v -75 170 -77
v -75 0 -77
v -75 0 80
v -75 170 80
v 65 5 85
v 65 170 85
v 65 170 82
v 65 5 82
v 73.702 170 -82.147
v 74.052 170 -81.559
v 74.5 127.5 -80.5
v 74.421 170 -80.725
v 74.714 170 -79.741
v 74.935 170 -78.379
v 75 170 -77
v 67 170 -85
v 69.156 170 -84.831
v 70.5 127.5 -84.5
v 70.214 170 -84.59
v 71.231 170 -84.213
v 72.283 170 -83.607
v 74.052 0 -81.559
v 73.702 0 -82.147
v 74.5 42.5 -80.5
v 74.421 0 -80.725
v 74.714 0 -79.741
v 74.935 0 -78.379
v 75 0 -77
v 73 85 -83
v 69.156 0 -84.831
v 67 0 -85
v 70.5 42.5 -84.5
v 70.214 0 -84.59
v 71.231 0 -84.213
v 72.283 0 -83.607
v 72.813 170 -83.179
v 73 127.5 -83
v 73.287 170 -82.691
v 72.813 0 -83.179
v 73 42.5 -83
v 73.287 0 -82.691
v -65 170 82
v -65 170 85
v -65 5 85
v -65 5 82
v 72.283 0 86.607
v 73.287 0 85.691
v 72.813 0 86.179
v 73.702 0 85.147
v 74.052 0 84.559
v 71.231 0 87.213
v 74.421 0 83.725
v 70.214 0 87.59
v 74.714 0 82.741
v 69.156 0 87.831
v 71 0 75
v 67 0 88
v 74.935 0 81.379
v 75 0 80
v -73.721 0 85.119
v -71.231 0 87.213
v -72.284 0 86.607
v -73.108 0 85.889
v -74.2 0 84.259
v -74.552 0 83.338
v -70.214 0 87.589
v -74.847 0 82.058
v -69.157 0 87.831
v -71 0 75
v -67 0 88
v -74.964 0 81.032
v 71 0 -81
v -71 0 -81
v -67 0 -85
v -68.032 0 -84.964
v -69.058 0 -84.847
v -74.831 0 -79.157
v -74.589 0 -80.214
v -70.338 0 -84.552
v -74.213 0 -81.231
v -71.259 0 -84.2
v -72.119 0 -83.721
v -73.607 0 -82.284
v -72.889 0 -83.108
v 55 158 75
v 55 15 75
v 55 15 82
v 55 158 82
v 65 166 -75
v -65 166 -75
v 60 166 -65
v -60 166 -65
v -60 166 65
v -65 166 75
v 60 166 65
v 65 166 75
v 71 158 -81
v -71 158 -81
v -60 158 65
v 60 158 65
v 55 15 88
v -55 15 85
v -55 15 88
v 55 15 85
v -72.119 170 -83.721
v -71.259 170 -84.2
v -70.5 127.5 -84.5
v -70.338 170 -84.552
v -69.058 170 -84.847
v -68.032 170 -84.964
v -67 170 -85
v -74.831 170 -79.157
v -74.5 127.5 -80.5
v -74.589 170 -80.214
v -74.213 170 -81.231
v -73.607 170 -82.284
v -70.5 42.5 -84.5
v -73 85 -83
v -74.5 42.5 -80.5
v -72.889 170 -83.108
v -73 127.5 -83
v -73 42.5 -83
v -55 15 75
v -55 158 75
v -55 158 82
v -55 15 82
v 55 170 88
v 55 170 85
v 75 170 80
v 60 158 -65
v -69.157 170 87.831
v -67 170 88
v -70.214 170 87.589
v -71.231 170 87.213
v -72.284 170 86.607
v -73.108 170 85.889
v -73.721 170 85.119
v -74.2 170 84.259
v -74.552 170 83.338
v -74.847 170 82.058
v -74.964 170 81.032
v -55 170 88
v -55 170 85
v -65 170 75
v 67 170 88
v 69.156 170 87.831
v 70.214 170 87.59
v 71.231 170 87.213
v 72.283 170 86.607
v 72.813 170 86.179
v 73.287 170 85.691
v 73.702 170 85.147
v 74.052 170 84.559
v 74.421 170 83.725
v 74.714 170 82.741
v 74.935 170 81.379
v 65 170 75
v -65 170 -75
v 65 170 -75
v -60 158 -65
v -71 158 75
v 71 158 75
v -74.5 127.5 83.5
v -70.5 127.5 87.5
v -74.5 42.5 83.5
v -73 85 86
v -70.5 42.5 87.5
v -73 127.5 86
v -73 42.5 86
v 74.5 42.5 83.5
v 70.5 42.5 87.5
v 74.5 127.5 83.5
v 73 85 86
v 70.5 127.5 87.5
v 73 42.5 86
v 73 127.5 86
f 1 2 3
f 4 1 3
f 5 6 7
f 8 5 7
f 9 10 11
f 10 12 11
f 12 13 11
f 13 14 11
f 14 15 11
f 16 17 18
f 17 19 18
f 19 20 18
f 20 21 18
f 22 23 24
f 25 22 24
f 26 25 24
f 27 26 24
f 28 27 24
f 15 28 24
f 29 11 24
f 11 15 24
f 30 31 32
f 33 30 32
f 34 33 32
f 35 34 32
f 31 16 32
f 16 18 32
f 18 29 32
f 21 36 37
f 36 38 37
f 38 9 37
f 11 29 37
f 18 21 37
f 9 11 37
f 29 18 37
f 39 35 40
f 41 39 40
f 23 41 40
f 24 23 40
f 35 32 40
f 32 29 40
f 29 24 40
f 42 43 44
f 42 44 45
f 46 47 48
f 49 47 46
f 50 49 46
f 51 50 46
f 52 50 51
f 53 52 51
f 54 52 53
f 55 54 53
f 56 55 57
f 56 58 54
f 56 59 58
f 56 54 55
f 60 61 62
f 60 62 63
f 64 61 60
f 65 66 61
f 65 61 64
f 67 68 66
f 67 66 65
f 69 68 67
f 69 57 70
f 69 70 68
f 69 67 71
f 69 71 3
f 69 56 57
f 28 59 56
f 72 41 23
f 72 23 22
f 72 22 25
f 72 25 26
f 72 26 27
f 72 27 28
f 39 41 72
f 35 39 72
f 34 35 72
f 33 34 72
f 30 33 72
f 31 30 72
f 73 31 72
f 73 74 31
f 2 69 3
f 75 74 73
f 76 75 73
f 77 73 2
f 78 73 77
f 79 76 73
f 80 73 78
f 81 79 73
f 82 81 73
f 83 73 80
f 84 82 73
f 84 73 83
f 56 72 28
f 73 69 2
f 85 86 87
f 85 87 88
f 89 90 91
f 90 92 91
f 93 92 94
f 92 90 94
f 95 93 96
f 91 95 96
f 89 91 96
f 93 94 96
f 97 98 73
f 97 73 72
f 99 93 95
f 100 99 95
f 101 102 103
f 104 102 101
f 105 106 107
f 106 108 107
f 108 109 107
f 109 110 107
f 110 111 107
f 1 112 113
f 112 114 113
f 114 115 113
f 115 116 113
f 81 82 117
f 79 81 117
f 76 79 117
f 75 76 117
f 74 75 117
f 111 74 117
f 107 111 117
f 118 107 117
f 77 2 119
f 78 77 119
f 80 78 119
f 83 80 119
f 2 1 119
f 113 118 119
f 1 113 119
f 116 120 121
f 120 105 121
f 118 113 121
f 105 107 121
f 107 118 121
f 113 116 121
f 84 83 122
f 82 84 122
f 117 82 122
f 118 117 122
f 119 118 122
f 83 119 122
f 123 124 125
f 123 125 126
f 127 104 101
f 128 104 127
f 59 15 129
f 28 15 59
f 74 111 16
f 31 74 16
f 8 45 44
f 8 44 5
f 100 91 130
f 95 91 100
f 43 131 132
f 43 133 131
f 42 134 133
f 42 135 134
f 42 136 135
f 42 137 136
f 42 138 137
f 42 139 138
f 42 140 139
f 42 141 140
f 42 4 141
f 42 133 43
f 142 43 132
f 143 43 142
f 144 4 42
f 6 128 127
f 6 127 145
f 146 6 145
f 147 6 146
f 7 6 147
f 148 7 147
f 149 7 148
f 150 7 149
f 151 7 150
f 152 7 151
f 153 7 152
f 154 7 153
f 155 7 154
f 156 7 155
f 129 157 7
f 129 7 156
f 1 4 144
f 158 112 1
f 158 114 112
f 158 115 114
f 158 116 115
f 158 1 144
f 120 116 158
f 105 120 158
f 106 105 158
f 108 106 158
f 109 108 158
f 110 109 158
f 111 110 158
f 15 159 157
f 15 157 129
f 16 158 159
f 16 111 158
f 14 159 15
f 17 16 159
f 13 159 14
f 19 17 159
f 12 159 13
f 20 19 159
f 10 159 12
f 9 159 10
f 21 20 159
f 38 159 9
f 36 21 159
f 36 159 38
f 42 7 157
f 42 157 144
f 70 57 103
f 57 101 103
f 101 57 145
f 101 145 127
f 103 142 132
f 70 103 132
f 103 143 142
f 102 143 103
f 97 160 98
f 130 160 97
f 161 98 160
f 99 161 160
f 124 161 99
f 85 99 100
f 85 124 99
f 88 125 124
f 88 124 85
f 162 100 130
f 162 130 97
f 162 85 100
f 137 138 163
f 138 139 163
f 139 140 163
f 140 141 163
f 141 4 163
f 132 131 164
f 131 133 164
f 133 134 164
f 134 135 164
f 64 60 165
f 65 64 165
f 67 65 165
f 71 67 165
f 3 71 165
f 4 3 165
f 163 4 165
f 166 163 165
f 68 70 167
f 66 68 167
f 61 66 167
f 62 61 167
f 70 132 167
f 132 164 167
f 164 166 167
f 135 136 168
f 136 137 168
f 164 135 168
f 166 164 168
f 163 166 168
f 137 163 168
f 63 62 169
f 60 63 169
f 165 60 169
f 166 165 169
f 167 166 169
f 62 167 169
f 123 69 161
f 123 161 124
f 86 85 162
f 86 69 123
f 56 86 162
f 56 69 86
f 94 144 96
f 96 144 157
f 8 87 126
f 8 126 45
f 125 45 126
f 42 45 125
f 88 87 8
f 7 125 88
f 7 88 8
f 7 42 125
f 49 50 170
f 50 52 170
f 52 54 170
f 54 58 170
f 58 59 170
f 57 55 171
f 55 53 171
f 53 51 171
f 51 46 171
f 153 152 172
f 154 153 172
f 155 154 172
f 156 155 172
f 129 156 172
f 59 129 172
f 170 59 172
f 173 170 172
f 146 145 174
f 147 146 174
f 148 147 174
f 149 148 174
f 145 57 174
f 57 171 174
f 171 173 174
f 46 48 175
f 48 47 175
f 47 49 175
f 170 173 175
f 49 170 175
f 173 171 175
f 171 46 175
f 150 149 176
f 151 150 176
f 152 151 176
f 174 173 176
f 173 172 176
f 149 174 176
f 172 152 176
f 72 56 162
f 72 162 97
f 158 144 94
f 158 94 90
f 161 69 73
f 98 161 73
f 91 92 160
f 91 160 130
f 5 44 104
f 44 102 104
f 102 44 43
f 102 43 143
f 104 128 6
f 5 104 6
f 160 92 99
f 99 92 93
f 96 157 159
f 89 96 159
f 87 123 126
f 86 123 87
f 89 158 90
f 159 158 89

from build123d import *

# Parameters (mm, degrees)
SKETCH_2_W                  = 150
SKETCH_2_H                  = 170
EXTRUDE_2_DEPTH             = 170
SHELL_5_T                   = -4
SKETCH_3_W                  = 130
SKETCH_3_H                  = 150
CUT_EXTRUDE_1_DEPTH         = 205.328167417
SKETCH_4_W                  = 150
SKETCH_4_H                  = 170
SKETCH_4_W_2                = 120
SKETCH_4_H_2                = 130
EXTRUDE_3_DEPTH             = 8
EXTRUDE_4_REACH             = 253.843
EXTRUDE_4_DIRECTION_2_DEPTH = 3
SKETCH_6_W                  = 130
SKETCH_6_H                  = 3
CUT_EXTRUDE_2_DEPTH         = 165
FILLET_1_SIZE               = 8


with BuildPart() as part:
    # 草圖2 → 填料-伸長2 (new body)
    with BuildSketch(Plane(origin=(0, 0, 0), x_dir=(1, 0, 0), z_dir=(0, 1, 0))):
        Rectangle(SKETCH_2_W, SKETCH_2_H)
    extrude(amount=EXTRUDE_2_DEPTH)

    # 薄殼5
    shell_5_openings = [part.faces().sort_by_distance(p)[0] for p in [
        (0, 0, 0),
        (0, 85, 85),
    ]]
    offset(amount=SHELL_5_T, openings=shell_5_openings, kind=Kind.INTERSECTION)

    # 草圖3 → 除料-伸長1 (cut, through all)
    with BuildSketch(Plane(origin=(0, 170, 0), x_dir=(1, 0, 0), z_dir=(0, 1, 0))):
        Rectangle(SKETCH_3_W, SKETCH_3_H)
    extrude(amount=-CUT_EXTRUDE_1_DEPTH, mode=Mode.SUBTRACT)

    # 草圖4 → 填料-伸長3 (add)
    with BuildSketch(Plane.XZ.offset(-166)):
        Rectangle(SKETCH_4_W, SKETCH_4_H)
        Rectangle(SKETCH_4_W_2, SKETCH_4_H_2, mode=Mode.SUBTRACT)
    extrude(amount=EXTRUDE_3_DEPTH)

    # 填料-伸長4: up to this face of the body (flat: up to its plane)
    extrude_4_end = Plane(part.part.faces().sort_by_distance((0, 168, 75))[0])
    # 草圖5 → 填料-伸長4 (add, up to the picked face)
    with BuildSketch(Plane.XY.offset(85), mode=Mode.PRIVATE) as extrude_4_sk1:
        Polygon((55, 170), (75, 170), (75, 0), (-75, 0), (-75, 170), (-55, 170), (-55, 15), (55, 15), align=None)
    extrude_4_tool1 = split(extrude(extrude_4_sk1.sketch, amount=-EXTRUDE_4_REACH, mode=Mode.PRIVATE), bisect_by=extrude_4_end, keep=Keep.BOTH, mode=Mode.PRIVATE)
    add(extrude_4_tool1.solids().sort_by(Axis((65, 167.732843, 85), (0, 0, -1)))[0])

    # 草圖5 → 填料-伸長4 direction 2 (add)
    with BuildSketch(Plane.XY.offset(85)):
        Polygon((55, 170), (75, 170), (75, 0), (-75, 0), (-75, 170), (-55, 170), (-55, 15), (55, 15), align=None)
    extrude(amount=EXTRUDE_4_DIRECTION_2_DEPTH)

    # 草圖6 → 除料-伸長2 (cut)
    with BuildSketch(Plane(origin=(0, 170, 0), x_dir=(1, 0, 0), z_dir=(0, 1, 0))):
        with Locations((0, -83.5)):
            Rectangle(SKETCH_6_W, SKETCH_6_H)
    extrude(amount=-CUT_EXTRUDE_2_DEPTH, mode=Mode.SUBTRACT)

    # 圓角1
    # a fillet whose section is not a circle: 8 mm, written as the material it takes off along each edge
    with BuildSketch(Plane(origin=(75, -20, -85), x_dir=(0, 0, 1), z_dir=(0, 1, 0)), Plane(origin=(-75, -20, -85), x_dir=(1, 0, 0), z_dir=(0, 1, 0)), Plane(origin=(75, 190, 88), x_dir=(0, 0, -1), z_dir=(0, -1, 0)), Plane(origin=(-75, -20, 88), x_dir=(0, 0, -1), z_dir=(0, 1, 0))) as fillet_1_piece_1:
        with BuildLine():
            Bezier((FILLET_1_SIZE, 0), (0, 0), (0, -FILLET_1_SIZE), weights=[1, 1, 1])
            Line((0, -FILLET_1_SIZE), (0, 0))
            Line((0, 0), (FILLET_1_SIZE, 0))
        make_face()
    extrude(amount=210, mode=Mode.SUBTRACT)


solid = part.part
